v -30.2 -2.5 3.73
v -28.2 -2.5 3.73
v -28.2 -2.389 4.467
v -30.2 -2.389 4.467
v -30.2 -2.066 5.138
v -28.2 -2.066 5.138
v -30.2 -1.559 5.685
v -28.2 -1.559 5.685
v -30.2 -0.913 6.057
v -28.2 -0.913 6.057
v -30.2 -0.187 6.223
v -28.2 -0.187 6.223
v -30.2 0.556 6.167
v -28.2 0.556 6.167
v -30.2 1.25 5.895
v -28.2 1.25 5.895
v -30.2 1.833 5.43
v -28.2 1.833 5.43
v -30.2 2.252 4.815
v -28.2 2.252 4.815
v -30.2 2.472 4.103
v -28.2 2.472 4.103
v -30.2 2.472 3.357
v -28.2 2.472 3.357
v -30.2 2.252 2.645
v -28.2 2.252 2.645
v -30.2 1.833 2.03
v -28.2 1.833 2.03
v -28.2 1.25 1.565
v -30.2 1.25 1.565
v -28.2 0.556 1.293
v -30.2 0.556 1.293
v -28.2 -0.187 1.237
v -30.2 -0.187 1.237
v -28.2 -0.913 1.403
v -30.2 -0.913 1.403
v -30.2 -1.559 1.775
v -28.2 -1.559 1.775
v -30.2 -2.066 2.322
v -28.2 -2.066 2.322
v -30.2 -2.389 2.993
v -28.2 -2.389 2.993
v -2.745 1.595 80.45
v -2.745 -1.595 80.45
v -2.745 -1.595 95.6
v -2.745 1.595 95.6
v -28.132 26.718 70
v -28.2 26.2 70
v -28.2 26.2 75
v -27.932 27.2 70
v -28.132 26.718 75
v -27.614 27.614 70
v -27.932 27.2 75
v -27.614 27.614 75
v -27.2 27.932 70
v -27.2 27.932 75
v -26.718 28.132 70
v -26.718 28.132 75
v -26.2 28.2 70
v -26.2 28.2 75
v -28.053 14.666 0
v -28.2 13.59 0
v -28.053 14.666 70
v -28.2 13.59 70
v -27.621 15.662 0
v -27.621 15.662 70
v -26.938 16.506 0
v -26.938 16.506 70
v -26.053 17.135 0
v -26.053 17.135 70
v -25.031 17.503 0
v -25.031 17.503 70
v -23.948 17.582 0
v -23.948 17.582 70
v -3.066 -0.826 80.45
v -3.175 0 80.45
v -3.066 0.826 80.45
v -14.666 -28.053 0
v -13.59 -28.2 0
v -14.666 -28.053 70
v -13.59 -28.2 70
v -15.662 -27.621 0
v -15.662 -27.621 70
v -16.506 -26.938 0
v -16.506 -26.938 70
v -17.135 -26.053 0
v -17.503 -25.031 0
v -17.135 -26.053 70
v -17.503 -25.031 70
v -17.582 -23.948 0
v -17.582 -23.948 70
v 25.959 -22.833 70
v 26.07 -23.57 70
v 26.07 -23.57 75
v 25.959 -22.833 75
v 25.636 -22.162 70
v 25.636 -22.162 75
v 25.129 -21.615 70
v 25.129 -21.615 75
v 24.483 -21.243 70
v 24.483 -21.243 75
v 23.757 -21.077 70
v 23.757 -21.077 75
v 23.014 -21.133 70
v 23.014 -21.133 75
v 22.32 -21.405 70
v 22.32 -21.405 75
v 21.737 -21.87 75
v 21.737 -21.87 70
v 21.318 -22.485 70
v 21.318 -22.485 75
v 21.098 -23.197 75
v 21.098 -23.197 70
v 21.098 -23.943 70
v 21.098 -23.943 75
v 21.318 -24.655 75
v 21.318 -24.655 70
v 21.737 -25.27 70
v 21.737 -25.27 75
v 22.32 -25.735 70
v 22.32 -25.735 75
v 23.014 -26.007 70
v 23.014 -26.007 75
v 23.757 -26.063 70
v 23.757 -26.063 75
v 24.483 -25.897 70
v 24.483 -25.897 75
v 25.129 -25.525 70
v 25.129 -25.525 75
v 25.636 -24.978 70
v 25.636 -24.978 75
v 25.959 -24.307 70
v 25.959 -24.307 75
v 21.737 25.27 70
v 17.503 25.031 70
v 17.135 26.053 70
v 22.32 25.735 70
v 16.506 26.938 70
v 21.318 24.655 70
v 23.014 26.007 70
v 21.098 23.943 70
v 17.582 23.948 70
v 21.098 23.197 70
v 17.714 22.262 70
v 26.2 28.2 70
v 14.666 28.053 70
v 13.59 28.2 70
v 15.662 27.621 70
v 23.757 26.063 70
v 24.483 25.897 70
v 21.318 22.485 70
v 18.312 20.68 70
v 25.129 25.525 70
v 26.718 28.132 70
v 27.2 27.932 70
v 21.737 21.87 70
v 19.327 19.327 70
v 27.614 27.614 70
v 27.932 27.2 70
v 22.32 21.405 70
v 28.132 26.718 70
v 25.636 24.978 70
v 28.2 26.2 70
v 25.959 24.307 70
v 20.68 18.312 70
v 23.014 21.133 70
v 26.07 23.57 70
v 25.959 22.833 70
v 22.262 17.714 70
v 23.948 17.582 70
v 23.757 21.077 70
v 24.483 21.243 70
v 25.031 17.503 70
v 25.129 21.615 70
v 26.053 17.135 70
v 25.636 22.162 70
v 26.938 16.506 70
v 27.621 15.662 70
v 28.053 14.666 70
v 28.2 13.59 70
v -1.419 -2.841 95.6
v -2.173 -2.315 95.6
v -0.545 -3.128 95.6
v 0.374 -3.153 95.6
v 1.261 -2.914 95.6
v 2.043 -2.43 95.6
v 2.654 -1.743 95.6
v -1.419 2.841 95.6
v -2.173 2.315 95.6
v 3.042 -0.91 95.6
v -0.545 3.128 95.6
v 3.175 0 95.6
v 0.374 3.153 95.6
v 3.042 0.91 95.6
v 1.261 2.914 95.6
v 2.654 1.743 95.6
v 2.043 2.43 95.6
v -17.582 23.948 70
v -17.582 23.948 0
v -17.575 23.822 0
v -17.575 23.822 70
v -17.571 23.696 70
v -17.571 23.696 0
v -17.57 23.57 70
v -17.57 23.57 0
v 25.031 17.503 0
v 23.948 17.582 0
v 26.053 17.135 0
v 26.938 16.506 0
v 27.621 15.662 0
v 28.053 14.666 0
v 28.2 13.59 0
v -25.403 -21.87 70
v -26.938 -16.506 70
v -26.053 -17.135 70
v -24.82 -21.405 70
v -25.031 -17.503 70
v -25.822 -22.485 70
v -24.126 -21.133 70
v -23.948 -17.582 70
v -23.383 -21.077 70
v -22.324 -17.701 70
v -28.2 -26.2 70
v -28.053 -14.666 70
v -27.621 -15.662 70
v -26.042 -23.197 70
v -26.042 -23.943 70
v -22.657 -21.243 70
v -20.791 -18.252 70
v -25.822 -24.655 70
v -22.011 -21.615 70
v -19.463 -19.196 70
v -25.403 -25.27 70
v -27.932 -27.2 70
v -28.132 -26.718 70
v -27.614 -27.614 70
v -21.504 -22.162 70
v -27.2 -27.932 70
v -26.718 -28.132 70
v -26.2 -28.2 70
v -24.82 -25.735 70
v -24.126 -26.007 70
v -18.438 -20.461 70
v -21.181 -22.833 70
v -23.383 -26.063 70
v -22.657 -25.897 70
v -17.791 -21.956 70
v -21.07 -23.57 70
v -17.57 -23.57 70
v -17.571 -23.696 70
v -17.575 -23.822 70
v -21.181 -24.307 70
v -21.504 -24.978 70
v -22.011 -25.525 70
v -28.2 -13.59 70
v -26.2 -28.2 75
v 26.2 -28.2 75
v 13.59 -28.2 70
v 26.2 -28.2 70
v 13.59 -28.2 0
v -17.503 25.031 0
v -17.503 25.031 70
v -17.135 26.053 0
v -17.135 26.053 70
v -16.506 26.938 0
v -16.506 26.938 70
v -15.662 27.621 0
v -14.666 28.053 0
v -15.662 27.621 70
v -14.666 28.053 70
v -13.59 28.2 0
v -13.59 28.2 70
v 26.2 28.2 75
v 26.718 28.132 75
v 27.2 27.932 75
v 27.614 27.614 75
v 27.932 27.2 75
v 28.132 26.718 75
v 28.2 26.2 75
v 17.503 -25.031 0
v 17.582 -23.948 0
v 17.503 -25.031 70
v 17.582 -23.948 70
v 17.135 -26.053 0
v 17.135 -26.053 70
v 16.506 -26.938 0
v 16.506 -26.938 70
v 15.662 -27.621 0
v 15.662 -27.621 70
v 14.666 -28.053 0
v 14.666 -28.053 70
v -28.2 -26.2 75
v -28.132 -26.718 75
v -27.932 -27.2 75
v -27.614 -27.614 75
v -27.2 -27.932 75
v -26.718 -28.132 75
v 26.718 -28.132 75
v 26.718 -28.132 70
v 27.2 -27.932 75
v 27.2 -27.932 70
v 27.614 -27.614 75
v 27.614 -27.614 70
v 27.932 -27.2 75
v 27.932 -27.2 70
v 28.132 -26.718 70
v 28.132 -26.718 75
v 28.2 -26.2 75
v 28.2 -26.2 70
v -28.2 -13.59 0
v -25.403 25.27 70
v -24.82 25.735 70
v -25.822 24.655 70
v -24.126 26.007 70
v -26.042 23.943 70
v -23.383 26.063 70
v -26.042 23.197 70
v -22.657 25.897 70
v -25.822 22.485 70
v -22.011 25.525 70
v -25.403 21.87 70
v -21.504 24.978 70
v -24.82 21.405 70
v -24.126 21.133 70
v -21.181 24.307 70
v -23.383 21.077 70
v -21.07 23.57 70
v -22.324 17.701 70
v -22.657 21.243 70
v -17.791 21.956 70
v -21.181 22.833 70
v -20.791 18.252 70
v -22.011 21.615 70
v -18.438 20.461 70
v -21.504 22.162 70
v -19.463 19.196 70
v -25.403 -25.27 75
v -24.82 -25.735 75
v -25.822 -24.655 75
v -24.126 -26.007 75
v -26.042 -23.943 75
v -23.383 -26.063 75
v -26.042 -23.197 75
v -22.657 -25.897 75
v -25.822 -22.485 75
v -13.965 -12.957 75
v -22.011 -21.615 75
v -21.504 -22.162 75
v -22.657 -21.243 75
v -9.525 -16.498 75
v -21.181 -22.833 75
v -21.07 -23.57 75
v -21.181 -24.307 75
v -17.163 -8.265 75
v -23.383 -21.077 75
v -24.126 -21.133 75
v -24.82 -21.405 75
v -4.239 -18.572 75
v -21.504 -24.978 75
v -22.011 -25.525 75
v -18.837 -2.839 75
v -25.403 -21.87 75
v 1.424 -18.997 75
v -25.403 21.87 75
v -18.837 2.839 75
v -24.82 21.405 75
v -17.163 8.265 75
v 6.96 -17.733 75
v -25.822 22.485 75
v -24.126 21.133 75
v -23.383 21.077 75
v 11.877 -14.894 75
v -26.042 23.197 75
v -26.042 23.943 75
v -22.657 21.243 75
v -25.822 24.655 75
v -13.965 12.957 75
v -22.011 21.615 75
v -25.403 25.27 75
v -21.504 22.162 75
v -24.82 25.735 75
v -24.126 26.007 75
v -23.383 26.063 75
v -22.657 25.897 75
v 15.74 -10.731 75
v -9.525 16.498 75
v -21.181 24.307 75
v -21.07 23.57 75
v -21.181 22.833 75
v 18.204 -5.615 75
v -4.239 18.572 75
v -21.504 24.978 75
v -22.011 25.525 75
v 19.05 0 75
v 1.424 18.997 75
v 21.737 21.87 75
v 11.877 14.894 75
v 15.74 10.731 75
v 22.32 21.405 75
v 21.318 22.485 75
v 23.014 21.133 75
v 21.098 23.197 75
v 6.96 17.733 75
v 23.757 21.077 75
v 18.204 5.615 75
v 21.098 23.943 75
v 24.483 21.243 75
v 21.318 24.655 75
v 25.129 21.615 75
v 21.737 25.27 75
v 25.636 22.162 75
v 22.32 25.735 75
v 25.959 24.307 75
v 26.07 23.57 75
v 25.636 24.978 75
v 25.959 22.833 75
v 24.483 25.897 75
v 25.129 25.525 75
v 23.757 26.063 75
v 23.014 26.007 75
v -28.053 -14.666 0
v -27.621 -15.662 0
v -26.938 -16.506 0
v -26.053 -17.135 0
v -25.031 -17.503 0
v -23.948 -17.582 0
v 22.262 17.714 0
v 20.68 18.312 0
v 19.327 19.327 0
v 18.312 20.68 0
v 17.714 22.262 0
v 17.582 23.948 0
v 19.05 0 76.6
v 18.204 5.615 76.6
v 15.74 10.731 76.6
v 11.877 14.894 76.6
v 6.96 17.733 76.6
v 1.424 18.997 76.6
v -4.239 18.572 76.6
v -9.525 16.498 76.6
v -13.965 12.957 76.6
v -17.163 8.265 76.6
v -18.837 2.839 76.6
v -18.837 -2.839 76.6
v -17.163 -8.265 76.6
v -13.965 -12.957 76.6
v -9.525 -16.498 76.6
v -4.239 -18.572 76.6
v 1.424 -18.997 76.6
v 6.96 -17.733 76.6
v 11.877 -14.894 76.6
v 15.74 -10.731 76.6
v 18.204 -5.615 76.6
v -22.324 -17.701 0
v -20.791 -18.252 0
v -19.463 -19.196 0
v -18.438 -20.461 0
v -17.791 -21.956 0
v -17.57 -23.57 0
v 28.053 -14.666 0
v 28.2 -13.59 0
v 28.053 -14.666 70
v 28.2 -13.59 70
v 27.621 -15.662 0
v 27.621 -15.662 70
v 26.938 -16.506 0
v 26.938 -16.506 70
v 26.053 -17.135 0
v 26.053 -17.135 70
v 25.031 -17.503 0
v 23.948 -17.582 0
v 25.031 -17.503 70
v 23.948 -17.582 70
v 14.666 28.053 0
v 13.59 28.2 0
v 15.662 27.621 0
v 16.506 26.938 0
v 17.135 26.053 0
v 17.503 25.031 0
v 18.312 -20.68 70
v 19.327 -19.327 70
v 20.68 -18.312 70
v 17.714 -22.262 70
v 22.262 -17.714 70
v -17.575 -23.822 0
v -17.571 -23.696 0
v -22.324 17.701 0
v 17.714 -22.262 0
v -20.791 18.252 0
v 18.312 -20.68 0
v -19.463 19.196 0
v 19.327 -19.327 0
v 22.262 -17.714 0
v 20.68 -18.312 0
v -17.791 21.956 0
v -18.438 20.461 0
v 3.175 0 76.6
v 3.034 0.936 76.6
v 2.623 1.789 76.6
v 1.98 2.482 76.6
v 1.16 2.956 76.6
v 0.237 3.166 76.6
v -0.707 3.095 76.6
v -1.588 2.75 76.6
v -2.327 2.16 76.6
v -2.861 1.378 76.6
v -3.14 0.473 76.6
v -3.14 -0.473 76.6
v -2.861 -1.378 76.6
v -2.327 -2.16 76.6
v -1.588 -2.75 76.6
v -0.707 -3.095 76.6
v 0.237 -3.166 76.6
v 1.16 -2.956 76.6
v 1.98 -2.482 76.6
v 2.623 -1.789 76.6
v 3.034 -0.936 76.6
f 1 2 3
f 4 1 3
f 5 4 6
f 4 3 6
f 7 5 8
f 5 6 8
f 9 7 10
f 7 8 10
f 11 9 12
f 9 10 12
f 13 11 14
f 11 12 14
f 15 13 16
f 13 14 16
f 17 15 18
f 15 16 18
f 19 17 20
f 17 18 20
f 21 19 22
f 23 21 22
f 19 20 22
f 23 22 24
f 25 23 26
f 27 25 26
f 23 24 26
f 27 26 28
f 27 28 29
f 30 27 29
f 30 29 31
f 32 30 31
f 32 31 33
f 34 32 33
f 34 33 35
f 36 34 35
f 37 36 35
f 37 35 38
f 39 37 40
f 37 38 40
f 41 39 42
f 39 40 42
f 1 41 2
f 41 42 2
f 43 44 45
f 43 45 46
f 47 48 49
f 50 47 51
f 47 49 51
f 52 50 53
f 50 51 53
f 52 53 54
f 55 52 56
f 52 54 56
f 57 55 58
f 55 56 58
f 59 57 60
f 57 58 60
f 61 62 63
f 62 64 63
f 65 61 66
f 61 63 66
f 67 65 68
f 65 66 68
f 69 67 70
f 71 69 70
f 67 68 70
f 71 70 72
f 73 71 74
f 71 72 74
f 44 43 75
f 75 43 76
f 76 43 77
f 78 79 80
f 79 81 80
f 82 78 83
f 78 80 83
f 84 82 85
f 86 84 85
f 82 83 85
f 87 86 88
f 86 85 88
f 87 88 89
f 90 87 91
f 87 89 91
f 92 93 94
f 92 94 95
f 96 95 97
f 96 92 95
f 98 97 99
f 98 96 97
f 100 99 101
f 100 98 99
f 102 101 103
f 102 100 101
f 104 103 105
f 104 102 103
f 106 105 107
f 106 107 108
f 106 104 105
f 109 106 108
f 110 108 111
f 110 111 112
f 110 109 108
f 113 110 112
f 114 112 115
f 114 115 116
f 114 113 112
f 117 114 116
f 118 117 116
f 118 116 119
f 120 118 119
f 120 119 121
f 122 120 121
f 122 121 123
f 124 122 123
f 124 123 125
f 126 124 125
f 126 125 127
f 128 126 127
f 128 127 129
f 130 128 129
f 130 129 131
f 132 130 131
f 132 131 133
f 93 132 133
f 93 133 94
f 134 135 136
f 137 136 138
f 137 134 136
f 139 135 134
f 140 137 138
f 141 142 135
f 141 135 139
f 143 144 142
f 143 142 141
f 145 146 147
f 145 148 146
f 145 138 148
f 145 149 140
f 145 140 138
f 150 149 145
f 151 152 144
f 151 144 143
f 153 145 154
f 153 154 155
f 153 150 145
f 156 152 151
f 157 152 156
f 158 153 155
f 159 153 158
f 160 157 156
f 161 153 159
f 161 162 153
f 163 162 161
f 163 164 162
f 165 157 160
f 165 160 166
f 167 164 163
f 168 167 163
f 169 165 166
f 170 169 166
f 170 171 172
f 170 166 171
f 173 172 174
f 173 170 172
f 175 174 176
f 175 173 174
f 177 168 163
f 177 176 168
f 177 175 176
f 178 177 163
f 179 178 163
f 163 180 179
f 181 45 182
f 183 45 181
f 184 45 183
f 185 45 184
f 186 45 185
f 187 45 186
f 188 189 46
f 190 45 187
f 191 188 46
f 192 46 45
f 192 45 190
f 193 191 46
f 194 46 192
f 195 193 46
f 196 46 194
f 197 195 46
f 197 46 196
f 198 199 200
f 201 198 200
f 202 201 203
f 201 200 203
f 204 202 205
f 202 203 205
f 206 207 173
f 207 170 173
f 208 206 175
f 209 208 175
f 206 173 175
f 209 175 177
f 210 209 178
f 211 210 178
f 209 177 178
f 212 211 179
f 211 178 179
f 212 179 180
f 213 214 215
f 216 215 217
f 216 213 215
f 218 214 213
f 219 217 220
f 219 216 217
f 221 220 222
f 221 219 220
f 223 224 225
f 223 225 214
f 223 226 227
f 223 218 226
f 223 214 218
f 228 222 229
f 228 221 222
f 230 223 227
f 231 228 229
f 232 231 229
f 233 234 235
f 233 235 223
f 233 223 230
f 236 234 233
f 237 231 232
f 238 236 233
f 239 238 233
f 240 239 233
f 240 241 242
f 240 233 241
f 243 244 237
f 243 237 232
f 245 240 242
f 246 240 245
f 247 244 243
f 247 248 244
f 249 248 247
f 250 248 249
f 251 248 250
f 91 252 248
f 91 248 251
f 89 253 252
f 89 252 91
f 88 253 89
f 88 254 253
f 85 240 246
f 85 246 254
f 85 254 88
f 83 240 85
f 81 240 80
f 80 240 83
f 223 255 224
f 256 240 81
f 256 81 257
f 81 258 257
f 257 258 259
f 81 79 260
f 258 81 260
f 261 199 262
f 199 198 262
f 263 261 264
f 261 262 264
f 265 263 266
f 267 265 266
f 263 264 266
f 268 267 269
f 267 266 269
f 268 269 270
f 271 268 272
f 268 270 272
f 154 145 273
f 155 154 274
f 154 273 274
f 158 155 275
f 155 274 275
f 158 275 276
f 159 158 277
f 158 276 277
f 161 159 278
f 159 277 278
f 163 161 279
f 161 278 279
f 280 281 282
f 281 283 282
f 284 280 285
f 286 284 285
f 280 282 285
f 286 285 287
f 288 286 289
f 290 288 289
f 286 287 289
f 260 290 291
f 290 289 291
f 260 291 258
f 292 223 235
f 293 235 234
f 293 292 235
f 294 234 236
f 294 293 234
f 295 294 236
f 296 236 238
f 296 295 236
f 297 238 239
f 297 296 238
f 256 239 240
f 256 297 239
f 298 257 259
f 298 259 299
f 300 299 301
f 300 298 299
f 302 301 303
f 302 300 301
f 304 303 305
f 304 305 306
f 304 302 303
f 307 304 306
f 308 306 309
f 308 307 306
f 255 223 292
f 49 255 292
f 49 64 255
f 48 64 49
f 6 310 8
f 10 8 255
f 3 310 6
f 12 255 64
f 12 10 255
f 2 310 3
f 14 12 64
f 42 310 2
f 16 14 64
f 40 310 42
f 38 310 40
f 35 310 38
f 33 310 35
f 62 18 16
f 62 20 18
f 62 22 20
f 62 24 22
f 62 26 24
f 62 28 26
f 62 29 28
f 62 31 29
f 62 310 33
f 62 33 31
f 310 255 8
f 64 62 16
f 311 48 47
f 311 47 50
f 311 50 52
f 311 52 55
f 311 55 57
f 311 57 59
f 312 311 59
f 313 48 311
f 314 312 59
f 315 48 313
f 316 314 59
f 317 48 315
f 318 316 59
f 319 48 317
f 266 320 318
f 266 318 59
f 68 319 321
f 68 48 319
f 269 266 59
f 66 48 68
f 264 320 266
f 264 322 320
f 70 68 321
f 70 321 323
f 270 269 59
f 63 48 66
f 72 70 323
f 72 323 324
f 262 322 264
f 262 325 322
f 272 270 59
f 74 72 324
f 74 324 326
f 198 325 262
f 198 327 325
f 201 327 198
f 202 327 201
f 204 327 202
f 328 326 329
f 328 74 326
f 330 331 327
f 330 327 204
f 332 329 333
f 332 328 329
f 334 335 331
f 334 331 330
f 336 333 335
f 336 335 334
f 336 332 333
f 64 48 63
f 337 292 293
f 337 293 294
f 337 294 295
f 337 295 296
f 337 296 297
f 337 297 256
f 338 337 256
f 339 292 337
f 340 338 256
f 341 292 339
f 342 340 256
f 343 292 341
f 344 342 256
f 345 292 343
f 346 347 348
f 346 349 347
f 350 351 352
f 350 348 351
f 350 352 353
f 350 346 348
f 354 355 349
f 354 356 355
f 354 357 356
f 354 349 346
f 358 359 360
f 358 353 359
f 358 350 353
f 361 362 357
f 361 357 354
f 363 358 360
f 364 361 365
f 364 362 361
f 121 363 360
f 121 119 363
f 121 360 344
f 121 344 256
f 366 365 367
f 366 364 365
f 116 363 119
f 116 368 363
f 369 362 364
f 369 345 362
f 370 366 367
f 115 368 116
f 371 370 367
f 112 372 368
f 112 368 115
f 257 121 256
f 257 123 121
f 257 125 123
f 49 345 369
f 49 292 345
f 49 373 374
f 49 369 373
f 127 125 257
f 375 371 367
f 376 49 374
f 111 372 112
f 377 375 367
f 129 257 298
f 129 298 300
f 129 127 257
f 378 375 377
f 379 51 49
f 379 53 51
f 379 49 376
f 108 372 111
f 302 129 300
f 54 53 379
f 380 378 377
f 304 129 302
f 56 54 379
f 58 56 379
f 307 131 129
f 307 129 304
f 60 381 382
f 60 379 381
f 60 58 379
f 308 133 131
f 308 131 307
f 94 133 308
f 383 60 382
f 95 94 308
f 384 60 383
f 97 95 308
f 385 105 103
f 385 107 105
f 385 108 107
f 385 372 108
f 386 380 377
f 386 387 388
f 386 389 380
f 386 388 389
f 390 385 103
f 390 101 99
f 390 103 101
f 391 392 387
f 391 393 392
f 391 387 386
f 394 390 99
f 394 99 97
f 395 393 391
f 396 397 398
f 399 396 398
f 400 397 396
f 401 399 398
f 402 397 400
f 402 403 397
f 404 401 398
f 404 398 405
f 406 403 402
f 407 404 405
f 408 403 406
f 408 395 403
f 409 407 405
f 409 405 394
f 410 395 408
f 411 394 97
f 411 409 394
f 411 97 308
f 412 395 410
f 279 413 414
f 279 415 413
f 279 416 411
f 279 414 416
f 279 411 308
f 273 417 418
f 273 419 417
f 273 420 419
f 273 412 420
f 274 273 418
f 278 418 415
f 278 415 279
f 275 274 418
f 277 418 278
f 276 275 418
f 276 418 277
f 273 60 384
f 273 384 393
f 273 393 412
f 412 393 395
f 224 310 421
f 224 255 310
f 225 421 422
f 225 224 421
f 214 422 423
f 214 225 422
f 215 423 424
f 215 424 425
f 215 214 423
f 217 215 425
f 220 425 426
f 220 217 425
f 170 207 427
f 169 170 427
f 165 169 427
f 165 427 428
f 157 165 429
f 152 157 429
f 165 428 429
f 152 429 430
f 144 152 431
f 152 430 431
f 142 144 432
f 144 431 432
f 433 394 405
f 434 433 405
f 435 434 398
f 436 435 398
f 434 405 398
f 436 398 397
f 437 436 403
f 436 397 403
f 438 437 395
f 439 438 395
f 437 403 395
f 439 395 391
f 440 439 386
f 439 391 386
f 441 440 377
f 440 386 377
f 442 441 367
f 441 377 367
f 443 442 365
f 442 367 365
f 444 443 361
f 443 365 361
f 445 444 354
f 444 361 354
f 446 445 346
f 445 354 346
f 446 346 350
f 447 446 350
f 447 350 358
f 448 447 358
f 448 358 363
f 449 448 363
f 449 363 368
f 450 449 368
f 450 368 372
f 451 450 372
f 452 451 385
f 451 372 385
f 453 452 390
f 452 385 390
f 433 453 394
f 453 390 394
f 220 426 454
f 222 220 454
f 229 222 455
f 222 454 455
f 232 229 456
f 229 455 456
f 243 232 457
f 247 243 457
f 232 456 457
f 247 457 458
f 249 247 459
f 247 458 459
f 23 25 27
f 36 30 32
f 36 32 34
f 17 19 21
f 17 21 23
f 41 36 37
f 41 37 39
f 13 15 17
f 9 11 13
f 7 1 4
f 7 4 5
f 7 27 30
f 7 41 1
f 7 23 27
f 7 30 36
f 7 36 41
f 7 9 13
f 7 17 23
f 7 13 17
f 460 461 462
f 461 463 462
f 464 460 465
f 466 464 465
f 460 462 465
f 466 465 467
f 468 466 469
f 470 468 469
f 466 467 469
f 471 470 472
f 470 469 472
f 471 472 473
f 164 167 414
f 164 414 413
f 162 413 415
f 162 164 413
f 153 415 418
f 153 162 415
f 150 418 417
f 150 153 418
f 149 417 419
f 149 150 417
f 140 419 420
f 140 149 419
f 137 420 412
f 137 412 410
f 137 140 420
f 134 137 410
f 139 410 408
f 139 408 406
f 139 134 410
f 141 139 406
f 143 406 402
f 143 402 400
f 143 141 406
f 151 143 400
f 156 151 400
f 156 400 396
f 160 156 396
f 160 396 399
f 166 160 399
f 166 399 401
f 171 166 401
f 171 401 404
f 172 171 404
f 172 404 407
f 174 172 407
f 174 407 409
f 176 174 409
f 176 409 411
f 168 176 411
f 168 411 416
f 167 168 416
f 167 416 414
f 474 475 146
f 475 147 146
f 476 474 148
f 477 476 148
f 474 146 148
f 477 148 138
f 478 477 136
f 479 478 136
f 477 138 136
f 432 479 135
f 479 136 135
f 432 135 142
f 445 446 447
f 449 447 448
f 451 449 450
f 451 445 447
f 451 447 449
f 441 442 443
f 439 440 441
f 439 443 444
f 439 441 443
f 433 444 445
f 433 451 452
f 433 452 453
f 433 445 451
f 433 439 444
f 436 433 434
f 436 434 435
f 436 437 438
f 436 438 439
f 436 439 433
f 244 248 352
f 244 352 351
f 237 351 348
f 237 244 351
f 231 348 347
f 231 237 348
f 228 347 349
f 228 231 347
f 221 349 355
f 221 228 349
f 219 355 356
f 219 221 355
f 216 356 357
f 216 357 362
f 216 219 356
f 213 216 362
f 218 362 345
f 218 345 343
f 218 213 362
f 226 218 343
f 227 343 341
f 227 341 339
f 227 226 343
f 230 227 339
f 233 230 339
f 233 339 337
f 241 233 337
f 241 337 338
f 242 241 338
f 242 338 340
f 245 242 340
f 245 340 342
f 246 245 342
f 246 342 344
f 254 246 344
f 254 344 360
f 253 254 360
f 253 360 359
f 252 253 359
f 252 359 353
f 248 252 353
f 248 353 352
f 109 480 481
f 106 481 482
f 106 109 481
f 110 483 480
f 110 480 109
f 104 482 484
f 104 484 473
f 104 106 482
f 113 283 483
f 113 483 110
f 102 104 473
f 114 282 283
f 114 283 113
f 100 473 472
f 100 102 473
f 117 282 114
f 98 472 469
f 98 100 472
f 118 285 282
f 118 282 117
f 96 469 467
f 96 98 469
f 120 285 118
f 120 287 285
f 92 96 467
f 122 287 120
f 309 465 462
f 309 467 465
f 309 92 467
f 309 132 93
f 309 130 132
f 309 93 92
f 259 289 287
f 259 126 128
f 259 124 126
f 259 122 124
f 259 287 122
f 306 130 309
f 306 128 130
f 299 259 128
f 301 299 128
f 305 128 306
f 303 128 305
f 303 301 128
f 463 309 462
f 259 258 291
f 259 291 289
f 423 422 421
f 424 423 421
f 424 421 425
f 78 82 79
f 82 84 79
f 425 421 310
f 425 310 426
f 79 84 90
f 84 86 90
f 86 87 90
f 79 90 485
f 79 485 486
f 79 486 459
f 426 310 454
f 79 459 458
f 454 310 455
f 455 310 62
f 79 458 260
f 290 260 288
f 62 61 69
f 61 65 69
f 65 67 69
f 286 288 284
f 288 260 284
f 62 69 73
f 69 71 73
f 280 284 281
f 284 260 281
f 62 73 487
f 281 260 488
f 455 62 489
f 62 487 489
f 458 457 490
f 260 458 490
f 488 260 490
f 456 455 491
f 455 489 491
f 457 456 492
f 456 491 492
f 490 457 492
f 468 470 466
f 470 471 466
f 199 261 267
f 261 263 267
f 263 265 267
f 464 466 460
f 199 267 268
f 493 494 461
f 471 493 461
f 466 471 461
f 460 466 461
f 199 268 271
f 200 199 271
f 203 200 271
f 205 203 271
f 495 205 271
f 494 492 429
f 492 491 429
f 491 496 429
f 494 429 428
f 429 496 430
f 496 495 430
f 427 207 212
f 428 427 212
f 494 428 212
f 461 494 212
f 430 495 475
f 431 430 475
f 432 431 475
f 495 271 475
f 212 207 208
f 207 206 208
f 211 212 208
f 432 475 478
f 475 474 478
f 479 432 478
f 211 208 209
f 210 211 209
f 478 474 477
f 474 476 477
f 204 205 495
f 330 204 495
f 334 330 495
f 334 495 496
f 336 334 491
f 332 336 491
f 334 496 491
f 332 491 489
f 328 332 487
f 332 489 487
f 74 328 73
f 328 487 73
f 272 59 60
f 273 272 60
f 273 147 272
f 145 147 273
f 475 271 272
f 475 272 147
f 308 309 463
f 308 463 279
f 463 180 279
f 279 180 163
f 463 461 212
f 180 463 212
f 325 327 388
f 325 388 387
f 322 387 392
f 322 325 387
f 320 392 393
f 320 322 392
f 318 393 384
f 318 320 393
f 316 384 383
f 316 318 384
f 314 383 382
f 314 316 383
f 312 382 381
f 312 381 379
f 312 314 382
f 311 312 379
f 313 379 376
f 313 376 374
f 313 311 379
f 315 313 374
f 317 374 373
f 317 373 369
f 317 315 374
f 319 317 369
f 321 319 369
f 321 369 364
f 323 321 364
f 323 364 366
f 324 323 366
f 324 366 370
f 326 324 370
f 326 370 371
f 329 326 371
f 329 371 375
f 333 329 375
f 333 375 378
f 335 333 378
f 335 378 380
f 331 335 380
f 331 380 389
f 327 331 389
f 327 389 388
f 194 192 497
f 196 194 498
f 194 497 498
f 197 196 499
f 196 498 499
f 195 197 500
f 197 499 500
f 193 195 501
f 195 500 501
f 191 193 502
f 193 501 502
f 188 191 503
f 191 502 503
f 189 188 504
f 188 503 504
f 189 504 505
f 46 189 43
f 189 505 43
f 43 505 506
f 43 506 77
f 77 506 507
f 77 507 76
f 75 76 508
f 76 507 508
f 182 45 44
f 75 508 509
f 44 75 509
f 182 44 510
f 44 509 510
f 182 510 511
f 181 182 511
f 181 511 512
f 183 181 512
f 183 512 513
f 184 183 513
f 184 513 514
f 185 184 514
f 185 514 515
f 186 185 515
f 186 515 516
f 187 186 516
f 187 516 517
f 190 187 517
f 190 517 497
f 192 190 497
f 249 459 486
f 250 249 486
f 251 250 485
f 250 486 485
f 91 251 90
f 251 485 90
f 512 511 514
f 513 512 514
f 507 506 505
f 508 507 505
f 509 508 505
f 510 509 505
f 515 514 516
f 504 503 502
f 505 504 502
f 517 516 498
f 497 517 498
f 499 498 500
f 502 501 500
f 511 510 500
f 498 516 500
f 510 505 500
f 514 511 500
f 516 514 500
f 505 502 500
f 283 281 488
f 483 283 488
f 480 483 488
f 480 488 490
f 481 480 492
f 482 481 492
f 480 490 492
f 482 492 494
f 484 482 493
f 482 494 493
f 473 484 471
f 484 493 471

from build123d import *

# Parameters (mm, degrees)
F0_W      = 56.4
F0_H      = 56.4
F0_R      = 2.5
F1_DEPTH  = 75
F2_R      = 19.05
F3_DEPTH  = 1.6
F4_R      = 3.175
F5_DEPTH  = 19
F6_R      = 2.5
F7_DEPTH  = 2
F8_R      = 2
F10_DEPTH = 15.15
F11_R     = 2.5
F12_DEPTH = 70
F13_R     = 4


with BuildPart() as f1:
    # F0 (on Top) → F1 (new body)
    with BuildSketch(Plane.XY):
        Rectangle(F0_W, F0_H)
        with Locations((-23.57, -23.57)):
            Circle(F0_R, mode=Mode.SUBTRACT)
        with Locations((23.57, -23.57)):
            Circle(F0_R, mode=Mode.SUBTRACT)
        with Locations((-23.57, 23.57)):
            Circle(F0_R, mode=Mode.SUBTRACT)
        with Locations((23.57, 23.57)):
            Circle(F0_R, mode=Mode.SUBTRACT)
    extrude(amount=F1_DEPTH)

    # F2 (on face) → F3 (join)
    with BuildSketch(Plane.XY.offset(75)):
        Circle(F2_R)
    extrude(amount=F3_DEPTH)

    # F6 (on face) → F7 (join)
    with BuildSketch(Plane(origin=(-28.2, 0, 0), x_dir=(0, -1, 0), z_dir=(-1, 0, 0))):
        with Locations((0, 3.7299594842)):
            Circle(F6_R)
    extrude(amount=F7_DEPTH)

    # F8
    f8_edges = [f1.edges().sort_by_distance(p)[0] for p in [
        (-28.2, 28.2, 37.5),
        (28.2, 28.2, 37.5),
        (28.2, -28.2, 37.5),
        (-28.2, -28.2, 37.5),
    ]]
    fillet(f8_edges, radius=F8_R)

    # F11 (on face) → F12 (cut)
    with BuildSketch(Plane(origin=(0, 0, 0), x_dir=(1, 0, 0), z_dir=(0, 0, -1))):
        with BuildLine():
            ThreePointArc((-28.2, 19.7538370056), (-21.5426865067, 17.9228768386), (-17.57, 23.57))
            ThreePointArc((-17.57, 23.57), (-18.1433537997, 26.1295919629), (-19.7538370056, 28.2))
            Line((-19.7538370056, 28.2), (-26.2, 28.2))
            ThreePointArc((-26.2, 28.2), (-27.6142135624, 27.6142135624), (-28.2, 26.2))
            Line((-28.2, 26.2), (-28.2, 19.7538370056))
        make_face()
        with Locations((-23.57, 23.57)):
            Circle(F11_R, mode=Mode.SUBTRACT)
        with BuildLine():
            Line((26.2, 28.2), (19.7538370056, 28.2))
            ThreePointArc((19.7538370056, 28.2), (19.3273593129, 19.3273593129), (28.2, 19.7538370056))
            Line((28.2, 19.7538370056), (28.2, 26.2))
            ThreePointArc((28.2, 26.2), (27.6142135624, 27.6142135624), (26.2, 28.2))
        make_face()
        with Locations((23.57, 23.57)):
            Circle(F11_R, mode=Mode.SUBTRACT)
        with BuildLine():
            ThreePointArc((29.57, 23.57), (26.1295919629, 28.9966462003), (19.7538370056, 28.2))
            Line((19.7538370056, 28.2), (26.2, 28.2))
            ThreePointArc((26.2, 28.2), (27.6142135624, 27.6142135624), (28.2, 26.2))
            Line((28.2, 26.2), (28.2, 19.7538370056))
            ThreePointArc((28.2, 19.7538370056), (29.2171231614, 21.5426865067), (29.57, 23.57))
        make_face()
        with BuildLine():
            ThreePointArc((-17.57, -23.57), (-21.5426865067, -17.9228768386), (-28.2, -19.7538370056))
            Line((-28.2, -19.7538370056), (-28.2, -26.2))
            ThreePointArc((-28.2, -26.2), (-27.6142135624, -27.6142135624), (-26.2, -28.2))
            Line((-26.2, -28.2), (-19.7538370056, -28.2))
            ThreePointArc((-19.7538370056, -28.2), (-18.1433537997, -26.1295919629), (-17.57, -23.57))
        make_face()
        with Locations((-23.57, -23.57)):
            Circle(F11_R, mode=Mode.SUBTRACT)
        with BuildLine():
            Line((28.2, -26.2), (28.2, -19.7538370056))
            ThreePointArc((28.2, -19.7538370056), (19.3273593129, -19.3273593129), (19.7538370056, -28.2))
            Line((19.7538370056, -28.2), (26.2, -28.2))
            ThreePointArc((26.2, -28.2), (27.6142135624, -27.6142135624), (28.2, -26.2))
        make_face()
        with Locations((23.57, -23.57)):
            Circle(F11_R, mode=Mode.SUBTRACT)
        with Locations((-23.57, 23.57)):
            Circle(F11_R)
        with Locations((23.57, 23.57)):
            Circle(F11_R)
        with Locations((-23.57, -23.57)):
            Circle(F11_R)
        with Locations((23.57, -23.57)):
            Circle(F11_R)
    extrude(amount=-F12_DEPTH, mode=Mode.SUBTRACT)

    # F13
    f13_edges = [f1.edges().sort_by_distance(p)[0] for p in [
        (-28.2, 19.753837, 35),
        (-19.753837, 28.2, 35),
        (-28.2, -19.753837, 35),
        (-19.753837, -28.2, 35),
        (19.753837, -28.2, 35),
        (28.2, -19.753837, 35),
        (28.2, 19.753837, 35),
        (19.753837, 28.2, 35),
    ]]
    fillet(f13_edges, radius=F13_R)


with BuildPart() as f5:
    # F4 (on face) → F5 (new body)
    with BuildSketch(Plane.XY.offset(76.6)):
        Circle(F4_R)
    extrude(amount=F5_DEPTH)

    # F9 (on face) → F10 (cut)
    with BuildSketch(Plane.XY.offset(95.6)):
        with BuildLine():
            ThreePointArc((-2.745, 1.595493654), (-3.175, 0), (-2.745, -1.595493654))
            Line((-2.745, -1.595493654), (-2.745, 1.595493654))
        make_face()
    extrude(amount=-F10_DEPTH, mode=Mode.SUBTRACT)


solid = Compound([f1.part, f5.part])
